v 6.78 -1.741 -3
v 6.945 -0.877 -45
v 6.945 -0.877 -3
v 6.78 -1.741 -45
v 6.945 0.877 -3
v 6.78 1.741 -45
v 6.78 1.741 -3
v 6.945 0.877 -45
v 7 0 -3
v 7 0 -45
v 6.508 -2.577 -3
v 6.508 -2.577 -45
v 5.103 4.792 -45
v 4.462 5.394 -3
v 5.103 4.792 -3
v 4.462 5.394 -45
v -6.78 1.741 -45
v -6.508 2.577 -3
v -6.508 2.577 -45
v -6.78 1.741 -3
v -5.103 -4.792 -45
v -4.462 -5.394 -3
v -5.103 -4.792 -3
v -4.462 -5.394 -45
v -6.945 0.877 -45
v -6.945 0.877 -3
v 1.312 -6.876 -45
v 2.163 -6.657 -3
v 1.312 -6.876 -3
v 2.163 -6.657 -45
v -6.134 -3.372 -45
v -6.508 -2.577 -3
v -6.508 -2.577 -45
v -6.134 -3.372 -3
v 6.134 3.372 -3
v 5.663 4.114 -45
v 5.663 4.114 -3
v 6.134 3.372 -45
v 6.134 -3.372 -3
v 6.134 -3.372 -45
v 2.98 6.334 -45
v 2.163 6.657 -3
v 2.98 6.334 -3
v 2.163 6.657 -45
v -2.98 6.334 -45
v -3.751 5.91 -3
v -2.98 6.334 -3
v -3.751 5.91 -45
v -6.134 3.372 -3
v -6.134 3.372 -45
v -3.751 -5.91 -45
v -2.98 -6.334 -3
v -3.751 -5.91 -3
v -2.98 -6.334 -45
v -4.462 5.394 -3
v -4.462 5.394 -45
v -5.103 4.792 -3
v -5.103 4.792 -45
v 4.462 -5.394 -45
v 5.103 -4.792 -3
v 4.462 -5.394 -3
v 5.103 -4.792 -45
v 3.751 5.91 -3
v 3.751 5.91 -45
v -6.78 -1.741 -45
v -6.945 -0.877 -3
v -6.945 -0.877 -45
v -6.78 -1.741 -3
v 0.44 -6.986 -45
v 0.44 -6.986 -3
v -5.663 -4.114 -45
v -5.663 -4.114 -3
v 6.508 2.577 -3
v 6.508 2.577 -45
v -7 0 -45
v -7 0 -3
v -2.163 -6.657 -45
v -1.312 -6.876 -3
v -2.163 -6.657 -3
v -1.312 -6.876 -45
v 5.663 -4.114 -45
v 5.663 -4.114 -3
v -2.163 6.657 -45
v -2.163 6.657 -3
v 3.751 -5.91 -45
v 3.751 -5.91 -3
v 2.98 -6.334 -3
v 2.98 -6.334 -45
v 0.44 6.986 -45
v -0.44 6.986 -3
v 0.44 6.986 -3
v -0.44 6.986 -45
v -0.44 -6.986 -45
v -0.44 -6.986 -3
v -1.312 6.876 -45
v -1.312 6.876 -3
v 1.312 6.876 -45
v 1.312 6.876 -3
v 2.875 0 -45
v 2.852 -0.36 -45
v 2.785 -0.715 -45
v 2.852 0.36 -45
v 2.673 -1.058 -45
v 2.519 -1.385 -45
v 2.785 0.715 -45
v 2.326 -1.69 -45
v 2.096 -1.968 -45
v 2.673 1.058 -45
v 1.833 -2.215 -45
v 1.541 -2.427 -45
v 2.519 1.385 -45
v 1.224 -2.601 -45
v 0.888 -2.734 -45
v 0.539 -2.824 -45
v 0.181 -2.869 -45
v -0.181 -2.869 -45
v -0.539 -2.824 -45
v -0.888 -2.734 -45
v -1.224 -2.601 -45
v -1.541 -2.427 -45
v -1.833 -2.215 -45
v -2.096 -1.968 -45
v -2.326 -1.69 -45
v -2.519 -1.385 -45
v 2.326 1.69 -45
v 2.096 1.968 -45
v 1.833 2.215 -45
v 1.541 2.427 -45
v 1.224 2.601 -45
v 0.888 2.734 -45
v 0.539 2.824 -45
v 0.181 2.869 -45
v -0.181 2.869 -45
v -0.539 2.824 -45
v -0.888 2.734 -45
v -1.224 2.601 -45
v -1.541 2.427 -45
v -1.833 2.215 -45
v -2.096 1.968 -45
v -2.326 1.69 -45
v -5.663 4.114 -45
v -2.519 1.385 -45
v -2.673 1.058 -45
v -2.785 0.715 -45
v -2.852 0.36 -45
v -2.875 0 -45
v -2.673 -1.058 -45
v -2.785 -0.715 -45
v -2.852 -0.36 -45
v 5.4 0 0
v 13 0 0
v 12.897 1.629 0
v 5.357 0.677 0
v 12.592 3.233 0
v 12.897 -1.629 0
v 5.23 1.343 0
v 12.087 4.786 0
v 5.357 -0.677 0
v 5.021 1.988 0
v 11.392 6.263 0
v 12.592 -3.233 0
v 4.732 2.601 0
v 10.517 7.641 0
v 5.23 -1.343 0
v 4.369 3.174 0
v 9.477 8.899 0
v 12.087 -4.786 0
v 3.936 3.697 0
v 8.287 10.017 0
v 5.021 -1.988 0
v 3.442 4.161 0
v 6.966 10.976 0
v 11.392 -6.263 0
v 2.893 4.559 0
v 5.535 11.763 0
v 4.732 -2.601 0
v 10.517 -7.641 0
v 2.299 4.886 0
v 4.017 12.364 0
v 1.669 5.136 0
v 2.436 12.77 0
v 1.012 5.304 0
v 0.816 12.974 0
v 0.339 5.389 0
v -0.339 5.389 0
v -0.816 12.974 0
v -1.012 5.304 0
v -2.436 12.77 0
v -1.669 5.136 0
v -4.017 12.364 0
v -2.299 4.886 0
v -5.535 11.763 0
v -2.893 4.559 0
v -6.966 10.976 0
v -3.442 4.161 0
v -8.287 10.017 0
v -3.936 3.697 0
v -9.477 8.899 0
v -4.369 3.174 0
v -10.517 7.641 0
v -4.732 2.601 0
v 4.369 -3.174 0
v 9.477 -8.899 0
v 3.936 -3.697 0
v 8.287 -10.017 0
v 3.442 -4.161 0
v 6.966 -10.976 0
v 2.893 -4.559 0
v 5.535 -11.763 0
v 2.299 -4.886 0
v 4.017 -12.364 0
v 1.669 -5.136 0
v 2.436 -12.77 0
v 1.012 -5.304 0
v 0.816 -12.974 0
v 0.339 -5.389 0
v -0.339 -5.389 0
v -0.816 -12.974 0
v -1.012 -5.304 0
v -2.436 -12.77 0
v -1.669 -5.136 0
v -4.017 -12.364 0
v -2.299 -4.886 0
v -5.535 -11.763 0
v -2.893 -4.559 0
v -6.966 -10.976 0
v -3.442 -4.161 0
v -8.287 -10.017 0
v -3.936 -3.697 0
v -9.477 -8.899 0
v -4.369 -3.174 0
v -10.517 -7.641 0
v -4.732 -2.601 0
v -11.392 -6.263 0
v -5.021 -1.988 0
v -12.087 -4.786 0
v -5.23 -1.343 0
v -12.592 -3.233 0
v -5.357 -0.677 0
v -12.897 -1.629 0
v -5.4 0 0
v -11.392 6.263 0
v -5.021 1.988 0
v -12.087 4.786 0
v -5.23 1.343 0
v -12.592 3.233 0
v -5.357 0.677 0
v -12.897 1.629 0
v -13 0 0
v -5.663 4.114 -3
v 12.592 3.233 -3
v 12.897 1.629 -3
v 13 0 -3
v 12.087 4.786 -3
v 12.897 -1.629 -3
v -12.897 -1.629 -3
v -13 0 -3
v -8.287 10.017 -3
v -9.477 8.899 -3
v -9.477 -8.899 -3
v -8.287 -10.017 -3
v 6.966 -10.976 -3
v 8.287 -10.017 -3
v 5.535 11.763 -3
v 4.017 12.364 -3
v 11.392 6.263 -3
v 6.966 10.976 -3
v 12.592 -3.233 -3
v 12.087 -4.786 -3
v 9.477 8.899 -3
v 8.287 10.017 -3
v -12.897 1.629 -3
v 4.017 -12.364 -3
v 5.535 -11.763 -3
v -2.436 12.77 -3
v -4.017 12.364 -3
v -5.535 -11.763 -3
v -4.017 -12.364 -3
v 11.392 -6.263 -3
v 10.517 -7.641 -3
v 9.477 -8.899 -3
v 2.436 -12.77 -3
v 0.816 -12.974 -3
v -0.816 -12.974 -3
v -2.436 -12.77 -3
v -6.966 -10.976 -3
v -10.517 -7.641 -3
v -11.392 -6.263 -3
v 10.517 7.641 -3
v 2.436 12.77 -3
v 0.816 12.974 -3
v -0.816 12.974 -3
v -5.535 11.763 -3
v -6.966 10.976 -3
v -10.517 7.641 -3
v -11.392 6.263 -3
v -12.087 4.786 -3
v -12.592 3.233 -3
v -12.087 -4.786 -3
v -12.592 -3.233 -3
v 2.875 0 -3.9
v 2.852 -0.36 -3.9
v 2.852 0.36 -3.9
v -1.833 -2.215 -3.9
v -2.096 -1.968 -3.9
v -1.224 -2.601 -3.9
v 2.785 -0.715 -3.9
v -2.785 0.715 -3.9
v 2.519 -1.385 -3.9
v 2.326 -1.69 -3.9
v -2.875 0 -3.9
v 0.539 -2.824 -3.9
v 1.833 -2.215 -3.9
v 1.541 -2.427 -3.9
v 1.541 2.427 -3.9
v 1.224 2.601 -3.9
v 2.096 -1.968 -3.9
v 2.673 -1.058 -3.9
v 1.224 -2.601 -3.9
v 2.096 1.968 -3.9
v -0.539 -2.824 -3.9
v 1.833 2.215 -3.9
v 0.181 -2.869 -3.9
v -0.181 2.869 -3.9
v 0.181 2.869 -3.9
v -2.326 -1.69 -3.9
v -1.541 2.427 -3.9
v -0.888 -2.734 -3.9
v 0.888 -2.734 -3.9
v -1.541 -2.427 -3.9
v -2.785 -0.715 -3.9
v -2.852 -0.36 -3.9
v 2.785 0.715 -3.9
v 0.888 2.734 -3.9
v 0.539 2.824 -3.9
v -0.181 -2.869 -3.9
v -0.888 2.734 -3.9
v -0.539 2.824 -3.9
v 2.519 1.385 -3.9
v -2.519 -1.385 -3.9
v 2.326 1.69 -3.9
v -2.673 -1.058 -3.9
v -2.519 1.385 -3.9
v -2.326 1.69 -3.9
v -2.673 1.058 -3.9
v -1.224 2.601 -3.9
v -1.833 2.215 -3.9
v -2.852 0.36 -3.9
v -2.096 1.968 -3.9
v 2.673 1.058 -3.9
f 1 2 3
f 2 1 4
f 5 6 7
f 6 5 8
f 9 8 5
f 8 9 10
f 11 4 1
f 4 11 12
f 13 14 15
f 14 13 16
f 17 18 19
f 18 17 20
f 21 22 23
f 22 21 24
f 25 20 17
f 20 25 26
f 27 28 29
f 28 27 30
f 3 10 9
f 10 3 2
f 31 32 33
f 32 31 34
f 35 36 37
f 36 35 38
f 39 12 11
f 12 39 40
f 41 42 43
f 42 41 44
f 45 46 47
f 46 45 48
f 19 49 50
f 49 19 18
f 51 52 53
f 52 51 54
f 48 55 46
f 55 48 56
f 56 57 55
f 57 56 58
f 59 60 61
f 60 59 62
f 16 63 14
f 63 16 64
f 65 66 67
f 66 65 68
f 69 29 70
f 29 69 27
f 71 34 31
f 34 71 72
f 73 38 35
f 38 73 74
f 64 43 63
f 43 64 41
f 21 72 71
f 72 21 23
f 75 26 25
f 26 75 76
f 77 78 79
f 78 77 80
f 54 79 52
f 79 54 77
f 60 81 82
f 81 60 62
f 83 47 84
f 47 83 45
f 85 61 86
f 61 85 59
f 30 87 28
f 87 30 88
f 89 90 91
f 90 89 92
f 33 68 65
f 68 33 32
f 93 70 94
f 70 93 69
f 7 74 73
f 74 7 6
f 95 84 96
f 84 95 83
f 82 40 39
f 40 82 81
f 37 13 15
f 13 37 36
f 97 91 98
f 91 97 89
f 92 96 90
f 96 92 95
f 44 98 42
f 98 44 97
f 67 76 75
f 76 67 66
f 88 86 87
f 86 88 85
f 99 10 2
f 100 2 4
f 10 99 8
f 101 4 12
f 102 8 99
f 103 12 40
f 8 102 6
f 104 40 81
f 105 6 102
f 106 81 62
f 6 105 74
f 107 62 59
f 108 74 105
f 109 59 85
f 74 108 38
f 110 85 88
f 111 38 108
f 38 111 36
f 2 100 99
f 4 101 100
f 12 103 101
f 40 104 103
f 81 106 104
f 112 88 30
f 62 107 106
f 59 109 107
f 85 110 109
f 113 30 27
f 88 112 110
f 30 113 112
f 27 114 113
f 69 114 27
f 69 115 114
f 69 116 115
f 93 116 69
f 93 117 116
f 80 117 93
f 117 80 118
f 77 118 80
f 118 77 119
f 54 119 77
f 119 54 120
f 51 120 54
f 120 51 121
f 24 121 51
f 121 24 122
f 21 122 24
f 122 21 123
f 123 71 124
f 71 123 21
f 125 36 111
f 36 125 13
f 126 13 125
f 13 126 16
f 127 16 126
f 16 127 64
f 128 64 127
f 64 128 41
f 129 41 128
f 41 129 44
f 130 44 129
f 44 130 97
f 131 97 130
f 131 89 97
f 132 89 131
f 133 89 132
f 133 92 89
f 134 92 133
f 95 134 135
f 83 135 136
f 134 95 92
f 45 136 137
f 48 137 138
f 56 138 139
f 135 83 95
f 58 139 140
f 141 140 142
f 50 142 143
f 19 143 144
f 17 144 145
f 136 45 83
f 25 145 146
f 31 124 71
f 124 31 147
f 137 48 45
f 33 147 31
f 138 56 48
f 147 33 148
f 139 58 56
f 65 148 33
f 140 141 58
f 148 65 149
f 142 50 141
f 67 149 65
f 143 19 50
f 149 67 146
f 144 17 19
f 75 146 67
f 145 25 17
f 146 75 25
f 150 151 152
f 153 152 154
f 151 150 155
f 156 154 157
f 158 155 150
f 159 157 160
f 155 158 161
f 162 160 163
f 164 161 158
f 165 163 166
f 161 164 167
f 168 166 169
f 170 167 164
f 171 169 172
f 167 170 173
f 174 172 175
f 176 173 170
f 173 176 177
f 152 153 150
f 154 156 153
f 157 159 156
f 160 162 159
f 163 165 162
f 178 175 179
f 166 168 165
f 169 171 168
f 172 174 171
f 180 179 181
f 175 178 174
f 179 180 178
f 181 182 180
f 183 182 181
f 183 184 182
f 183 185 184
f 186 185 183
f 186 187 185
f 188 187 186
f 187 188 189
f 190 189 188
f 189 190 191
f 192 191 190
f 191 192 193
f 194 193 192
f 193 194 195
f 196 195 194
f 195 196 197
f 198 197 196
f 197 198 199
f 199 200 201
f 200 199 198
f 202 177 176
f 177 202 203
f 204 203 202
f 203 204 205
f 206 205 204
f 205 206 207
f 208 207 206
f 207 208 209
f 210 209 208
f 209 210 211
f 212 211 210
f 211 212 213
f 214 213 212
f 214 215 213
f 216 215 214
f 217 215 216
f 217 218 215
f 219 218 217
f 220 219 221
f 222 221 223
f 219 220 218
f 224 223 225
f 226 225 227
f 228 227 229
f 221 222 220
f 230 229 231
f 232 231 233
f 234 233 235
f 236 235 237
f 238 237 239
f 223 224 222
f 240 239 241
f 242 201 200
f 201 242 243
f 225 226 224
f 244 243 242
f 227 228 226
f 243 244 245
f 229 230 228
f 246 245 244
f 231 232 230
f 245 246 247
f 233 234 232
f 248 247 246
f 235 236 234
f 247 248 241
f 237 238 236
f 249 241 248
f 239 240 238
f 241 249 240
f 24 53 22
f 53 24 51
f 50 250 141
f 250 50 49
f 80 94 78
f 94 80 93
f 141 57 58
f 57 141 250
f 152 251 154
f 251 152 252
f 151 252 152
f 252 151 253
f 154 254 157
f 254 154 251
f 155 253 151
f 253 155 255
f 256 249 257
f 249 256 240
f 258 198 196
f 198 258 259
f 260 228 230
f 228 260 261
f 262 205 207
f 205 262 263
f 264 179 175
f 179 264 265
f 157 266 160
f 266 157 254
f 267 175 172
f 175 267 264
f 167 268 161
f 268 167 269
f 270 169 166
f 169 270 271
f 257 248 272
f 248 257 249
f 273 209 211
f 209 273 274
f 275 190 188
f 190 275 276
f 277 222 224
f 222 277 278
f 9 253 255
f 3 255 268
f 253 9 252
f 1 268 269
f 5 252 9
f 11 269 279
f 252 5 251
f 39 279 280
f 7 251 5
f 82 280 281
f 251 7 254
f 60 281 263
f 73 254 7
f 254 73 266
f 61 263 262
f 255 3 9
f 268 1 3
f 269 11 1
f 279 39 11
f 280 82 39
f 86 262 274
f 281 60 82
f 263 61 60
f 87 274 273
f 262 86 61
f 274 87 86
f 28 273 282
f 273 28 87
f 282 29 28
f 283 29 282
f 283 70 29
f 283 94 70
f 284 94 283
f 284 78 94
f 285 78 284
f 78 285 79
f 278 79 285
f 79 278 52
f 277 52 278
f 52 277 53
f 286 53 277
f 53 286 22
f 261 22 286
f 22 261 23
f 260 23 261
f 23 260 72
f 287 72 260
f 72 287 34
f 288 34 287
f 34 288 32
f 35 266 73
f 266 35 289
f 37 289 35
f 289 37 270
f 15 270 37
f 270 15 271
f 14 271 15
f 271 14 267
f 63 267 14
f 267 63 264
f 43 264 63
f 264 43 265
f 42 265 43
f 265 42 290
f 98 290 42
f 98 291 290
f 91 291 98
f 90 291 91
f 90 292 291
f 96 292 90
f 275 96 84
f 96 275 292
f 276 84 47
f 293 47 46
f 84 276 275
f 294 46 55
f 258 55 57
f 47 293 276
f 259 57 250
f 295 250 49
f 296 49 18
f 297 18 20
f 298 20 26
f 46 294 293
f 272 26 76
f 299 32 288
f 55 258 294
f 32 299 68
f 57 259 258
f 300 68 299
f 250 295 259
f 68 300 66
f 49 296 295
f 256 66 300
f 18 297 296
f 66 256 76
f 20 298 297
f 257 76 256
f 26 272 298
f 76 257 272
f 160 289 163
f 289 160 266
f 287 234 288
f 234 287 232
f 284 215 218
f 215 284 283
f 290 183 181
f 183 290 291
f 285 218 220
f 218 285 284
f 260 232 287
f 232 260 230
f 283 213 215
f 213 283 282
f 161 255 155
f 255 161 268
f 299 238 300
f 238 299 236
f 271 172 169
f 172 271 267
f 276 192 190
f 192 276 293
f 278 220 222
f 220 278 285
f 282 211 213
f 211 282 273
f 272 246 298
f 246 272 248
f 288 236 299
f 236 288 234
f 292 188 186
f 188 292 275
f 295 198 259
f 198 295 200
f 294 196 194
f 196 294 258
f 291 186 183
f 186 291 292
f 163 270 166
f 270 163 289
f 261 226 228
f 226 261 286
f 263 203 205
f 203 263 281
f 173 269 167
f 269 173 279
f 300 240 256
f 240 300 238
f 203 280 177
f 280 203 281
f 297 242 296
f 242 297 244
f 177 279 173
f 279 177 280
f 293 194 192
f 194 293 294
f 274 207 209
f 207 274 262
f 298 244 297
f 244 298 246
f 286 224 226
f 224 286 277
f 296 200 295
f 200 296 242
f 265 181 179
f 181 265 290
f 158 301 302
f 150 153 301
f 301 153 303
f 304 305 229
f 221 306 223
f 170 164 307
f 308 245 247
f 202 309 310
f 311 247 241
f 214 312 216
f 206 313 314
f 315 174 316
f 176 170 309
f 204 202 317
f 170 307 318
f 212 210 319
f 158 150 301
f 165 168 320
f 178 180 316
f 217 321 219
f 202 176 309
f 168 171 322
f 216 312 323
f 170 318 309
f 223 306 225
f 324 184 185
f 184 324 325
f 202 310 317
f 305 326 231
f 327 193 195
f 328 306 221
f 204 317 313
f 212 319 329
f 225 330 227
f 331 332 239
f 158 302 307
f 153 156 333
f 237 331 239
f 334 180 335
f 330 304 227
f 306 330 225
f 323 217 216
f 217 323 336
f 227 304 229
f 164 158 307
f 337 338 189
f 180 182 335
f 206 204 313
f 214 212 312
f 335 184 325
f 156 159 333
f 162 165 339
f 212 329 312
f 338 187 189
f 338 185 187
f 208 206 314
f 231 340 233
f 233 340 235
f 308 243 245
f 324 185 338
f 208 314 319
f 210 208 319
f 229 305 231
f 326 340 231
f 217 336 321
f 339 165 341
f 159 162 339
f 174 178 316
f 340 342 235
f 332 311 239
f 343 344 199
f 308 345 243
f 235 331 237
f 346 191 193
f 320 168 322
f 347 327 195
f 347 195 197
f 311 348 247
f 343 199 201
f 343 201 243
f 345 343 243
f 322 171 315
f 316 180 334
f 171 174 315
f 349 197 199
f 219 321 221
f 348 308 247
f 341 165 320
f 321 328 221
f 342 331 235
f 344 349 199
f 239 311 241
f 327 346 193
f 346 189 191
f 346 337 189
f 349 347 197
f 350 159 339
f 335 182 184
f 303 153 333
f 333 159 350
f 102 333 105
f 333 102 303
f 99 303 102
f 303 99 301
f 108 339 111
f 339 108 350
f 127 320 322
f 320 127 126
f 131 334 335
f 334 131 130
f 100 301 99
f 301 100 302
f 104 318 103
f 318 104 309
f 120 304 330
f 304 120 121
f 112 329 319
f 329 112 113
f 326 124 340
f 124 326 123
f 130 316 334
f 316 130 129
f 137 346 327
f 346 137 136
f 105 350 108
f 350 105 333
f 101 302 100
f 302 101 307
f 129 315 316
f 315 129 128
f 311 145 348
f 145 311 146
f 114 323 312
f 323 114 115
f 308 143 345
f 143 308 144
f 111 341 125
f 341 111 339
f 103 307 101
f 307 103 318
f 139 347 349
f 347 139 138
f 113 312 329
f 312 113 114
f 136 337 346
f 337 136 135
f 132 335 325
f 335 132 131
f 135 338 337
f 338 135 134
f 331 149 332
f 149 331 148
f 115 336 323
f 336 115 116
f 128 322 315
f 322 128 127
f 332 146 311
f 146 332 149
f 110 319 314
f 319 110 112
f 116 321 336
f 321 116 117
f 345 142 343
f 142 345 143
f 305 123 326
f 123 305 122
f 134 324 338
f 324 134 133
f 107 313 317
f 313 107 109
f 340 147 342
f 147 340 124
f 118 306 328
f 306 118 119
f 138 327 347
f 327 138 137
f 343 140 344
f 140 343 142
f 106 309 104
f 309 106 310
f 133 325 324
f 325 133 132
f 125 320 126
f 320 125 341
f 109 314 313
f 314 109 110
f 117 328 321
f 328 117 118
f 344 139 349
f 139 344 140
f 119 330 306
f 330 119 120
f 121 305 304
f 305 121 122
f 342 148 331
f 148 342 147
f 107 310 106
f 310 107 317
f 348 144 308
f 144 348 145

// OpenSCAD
$fn = 50;


difference() {
	union() {
		translate(v = [0, 0, -45.0000000000]) {
			cylinder(h = 45, r = 7.0000000000);
		}
		translate(v = [0, 0, -3.0000000000]) {
			cylinder(h = 3, r = 13.0000000000);
		}
	}
	union() {
		translate(v = [0, 0, 0]) {
			rotate(a = [0, 0, 0]) {
				difference() {
					union() {
						#translate(v = [0, 0, -45.0000000000]) {
							cylinder(h = 45, r = 2.6000000000);
						}
						#translate(v = [0, 0, -3.9000000000]) {
							cylinder(h = 3.9000000000, r1 = 2.8750000000, r2 = 5.4000000000);
						}
						#translate(v = [0, 0, -45.0000000000]) {
							cylinder(h = 45, r = 2.8750000000);
						}
						#translate(v = [0, 0, -45.0000000000]) {
							cylinder(h = 45, r = 2.6000000000);
						}
					}
					union();
				}
			}
		}
	}
}
